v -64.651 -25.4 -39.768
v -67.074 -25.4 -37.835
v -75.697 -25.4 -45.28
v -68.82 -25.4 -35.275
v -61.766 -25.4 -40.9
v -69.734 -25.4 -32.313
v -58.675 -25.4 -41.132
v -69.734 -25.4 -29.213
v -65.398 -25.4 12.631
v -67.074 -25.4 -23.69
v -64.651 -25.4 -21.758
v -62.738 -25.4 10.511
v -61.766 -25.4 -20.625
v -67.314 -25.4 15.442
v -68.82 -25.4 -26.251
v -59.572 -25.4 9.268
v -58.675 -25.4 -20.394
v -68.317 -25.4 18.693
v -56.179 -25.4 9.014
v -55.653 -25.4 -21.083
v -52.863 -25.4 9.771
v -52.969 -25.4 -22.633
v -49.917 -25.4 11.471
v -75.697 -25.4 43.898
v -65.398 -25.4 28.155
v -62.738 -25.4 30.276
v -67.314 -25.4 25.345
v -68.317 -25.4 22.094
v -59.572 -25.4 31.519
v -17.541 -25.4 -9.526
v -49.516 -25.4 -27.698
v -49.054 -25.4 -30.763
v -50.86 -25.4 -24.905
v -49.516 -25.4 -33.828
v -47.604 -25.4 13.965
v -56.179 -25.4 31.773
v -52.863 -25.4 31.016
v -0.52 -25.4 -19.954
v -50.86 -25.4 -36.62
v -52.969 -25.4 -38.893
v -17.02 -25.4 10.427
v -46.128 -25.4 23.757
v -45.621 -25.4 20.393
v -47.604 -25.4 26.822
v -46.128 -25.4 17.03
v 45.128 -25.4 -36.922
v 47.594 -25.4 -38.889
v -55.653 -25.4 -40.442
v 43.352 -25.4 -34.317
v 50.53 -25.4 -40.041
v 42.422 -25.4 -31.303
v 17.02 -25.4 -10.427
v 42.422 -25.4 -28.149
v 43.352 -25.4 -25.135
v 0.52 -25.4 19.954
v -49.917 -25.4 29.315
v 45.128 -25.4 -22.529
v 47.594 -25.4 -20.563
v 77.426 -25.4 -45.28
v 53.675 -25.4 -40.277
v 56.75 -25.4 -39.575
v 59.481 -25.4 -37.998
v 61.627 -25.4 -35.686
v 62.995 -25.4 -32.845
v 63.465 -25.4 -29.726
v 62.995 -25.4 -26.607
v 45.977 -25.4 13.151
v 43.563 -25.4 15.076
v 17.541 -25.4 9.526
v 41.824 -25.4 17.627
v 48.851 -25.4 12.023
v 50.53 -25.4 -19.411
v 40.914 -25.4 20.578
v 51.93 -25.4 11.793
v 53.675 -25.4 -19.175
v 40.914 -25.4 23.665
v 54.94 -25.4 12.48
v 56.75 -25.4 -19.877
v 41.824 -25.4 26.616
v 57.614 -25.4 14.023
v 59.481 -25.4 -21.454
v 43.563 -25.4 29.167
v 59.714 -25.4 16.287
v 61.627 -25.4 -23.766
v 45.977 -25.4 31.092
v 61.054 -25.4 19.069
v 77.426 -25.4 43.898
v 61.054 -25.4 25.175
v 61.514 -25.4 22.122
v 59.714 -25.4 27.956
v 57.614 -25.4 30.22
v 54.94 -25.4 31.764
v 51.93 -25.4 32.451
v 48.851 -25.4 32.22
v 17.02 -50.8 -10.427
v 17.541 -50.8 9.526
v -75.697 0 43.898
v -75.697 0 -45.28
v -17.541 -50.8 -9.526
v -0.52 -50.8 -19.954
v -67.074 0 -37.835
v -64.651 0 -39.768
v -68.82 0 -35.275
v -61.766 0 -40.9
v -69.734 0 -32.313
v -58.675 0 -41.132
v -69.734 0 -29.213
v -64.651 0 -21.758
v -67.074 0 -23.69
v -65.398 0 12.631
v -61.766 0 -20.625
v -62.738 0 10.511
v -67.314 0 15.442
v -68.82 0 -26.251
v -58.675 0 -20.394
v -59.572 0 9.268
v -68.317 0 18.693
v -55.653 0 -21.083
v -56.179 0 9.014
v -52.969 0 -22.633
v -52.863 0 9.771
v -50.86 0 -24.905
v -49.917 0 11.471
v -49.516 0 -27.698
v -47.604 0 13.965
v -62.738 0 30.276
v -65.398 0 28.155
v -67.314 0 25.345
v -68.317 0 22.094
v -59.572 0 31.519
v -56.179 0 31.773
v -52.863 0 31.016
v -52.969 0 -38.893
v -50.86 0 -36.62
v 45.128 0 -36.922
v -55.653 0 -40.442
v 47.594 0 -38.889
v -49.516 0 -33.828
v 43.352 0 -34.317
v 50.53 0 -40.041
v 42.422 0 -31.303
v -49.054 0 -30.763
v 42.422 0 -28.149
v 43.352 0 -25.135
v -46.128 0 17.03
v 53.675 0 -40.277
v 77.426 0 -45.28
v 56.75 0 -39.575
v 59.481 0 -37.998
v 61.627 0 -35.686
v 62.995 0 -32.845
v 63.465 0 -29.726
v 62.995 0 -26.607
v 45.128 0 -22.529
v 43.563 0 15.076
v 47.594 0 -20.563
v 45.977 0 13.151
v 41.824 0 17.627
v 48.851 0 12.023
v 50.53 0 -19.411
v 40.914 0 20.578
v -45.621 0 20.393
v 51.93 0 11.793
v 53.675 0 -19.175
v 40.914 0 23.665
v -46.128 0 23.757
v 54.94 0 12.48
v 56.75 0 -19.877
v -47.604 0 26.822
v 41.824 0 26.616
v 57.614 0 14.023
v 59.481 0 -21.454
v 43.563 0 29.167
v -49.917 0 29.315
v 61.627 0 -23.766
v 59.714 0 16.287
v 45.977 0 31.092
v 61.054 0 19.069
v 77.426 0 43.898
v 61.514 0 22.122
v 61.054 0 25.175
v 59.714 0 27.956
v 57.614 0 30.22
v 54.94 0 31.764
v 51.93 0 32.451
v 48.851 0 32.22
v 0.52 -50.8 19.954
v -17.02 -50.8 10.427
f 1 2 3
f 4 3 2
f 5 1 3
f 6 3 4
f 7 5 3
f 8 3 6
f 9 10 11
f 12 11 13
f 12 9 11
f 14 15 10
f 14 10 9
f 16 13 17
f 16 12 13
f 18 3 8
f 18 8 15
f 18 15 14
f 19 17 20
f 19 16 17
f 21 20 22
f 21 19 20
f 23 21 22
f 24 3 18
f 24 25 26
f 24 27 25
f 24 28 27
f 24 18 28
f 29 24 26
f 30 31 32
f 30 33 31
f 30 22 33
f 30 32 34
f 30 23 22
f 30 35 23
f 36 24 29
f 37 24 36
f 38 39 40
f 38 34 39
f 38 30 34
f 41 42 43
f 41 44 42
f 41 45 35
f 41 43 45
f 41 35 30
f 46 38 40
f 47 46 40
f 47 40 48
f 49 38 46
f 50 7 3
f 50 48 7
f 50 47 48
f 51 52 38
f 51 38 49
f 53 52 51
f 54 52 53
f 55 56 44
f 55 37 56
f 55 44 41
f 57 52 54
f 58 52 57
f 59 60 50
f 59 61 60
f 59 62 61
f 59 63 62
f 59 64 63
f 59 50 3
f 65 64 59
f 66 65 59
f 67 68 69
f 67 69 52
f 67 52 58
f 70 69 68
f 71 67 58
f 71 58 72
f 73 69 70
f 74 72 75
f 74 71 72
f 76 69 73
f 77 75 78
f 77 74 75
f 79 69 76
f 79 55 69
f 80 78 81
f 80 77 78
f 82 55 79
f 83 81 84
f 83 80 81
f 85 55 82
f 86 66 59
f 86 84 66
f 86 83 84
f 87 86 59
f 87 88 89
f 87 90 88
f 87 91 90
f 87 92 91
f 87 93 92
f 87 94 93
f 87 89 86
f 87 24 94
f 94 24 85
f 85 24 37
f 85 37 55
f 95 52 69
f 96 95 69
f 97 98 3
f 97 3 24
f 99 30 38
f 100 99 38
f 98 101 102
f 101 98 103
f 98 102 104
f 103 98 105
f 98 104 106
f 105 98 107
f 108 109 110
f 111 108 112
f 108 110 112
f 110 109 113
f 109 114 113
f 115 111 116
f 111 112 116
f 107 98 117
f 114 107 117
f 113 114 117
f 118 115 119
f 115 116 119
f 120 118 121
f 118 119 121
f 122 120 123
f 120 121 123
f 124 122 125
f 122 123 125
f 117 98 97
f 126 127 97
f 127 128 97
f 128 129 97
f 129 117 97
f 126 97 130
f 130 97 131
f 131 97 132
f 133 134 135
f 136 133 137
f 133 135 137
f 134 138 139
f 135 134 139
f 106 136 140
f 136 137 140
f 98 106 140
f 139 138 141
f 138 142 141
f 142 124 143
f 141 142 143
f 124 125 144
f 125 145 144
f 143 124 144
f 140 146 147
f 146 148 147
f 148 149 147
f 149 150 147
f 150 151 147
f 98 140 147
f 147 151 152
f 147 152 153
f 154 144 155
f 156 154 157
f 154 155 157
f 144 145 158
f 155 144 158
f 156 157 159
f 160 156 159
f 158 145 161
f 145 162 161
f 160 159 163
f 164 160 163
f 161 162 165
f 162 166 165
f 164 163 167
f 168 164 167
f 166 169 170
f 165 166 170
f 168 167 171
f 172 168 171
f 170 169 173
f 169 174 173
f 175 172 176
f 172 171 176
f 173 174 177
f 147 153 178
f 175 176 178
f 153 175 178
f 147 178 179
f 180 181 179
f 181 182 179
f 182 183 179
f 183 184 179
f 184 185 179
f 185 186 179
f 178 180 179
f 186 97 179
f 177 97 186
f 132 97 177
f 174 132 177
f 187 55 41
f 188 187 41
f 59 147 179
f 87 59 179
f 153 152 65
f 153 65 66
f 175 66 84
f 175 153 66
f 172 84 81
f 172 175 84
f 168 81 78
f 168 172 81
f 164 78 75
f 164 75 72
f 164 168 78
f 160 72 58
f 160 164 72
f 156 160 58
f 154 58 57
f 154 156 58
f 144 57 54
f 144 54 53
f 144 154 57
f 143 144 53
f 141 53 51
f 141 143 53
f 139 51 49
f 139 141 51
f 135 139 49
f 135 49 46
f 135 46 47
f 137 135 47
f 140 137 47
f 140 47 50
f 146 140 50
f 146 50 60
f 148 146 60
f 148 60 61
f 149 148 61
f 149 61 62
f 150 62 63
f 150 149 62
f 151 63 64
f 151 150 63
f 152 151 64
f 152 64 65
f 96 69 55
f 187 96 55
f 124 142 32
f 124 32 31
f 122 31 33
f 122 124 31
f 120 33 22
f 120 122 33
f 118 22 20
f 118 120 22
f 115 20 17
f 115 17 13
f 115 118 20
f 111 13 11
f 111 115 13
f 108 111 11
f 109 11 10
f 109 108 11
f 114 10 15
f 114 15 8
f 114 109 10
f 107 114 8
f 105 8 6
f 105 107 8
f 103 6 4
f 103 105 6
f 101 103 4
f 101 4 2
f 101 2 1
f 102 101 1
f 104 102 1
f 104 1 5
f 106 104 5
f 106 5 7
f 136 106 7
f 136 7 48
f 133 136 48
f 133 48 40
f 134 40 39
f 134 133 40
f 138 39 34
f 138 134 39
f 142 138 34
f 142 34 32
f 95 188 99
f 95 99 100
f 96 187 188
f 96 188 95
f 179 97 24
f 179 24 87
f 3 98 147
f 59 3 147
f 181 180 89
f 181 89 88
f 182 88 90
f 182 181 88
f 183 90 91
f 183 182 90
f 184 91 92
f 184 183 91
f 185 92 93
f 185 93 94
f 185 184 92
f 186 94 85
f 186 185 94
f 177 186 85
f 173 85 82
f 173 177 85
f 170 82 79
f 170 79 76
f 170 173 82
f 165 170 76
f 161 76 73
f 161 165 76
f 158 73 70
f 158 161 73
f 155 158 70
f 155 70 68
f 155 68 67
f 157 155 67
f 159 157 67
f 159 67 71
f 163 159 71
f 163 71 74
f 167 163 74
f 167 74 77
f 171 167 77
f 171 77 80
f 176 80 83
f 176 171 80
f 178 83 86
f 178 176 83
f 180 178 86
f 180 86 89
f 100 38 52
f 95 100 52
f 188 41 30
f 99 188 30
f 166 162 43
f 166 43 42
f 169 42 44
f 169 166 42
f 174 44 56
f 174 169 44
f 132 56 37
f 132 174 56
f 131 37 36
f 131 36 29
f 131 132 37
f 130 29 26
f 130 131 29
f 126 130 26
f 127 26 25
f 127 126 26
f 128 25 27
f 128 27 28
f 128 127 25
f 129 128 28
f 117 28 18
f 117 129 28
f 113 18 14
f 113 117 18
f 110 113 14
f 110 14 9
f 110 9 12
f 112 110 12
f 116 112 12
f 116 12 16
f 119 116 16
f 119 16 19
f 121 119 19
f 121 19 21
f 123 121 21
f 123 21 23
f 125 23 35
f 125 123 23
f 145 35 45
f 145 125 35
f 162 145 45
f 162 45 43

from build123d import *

# Parameters (mm, degrees)
F0_W     = 153.123051
F0_H     = 89.177757
F0_R     = 10.398269
F0_R_2   = 10.580509
F0_R_3   = 11.411691
F0_R_4   = 10.35798
F1_DEPTH = 25.4
F3_DEPTH = 25.4


with BuildPart() as f1:
    # F0 (on Front) → F1 (new body)
    with BuildSketch(Plane.XZ):
        with Locations((0.864126, -0.691298)):
            Rectangle(F0_W, F0_H)
        with Locations((-59.451837, -30.762867)):
            Circle(F0_R, mode=Mode.SUBTRACT)
        with Locations((52.884482, -29.725916)):
            Circle(F0_R_2, mode=Mode.SUBTRACT)
        with Locations((-57.032287, 20.393362)):
            Circle(F0_R_3, mode=Mode.SUBTRACT)
        with Locations((51.15623, 22.121616)):
            Circle(F0_R_4, mode=Mode.SUBTRACT)
    extrude(amount=F1_DEPTH)

    # F2 (on face) → F3 (join)
    with BuildSketch(Plane.XZ.offset(25.4)):
        Polygon((17.54057, 9.526291), (0.520275, 19.953725), (-17.020295, 10.427433), (-17.54057, -9.526291), (-0.520275, -19.953725), (17.020295, -10.427433), align=None)
    extrude(amount=F3_DEPTH)


solid = f1.part
